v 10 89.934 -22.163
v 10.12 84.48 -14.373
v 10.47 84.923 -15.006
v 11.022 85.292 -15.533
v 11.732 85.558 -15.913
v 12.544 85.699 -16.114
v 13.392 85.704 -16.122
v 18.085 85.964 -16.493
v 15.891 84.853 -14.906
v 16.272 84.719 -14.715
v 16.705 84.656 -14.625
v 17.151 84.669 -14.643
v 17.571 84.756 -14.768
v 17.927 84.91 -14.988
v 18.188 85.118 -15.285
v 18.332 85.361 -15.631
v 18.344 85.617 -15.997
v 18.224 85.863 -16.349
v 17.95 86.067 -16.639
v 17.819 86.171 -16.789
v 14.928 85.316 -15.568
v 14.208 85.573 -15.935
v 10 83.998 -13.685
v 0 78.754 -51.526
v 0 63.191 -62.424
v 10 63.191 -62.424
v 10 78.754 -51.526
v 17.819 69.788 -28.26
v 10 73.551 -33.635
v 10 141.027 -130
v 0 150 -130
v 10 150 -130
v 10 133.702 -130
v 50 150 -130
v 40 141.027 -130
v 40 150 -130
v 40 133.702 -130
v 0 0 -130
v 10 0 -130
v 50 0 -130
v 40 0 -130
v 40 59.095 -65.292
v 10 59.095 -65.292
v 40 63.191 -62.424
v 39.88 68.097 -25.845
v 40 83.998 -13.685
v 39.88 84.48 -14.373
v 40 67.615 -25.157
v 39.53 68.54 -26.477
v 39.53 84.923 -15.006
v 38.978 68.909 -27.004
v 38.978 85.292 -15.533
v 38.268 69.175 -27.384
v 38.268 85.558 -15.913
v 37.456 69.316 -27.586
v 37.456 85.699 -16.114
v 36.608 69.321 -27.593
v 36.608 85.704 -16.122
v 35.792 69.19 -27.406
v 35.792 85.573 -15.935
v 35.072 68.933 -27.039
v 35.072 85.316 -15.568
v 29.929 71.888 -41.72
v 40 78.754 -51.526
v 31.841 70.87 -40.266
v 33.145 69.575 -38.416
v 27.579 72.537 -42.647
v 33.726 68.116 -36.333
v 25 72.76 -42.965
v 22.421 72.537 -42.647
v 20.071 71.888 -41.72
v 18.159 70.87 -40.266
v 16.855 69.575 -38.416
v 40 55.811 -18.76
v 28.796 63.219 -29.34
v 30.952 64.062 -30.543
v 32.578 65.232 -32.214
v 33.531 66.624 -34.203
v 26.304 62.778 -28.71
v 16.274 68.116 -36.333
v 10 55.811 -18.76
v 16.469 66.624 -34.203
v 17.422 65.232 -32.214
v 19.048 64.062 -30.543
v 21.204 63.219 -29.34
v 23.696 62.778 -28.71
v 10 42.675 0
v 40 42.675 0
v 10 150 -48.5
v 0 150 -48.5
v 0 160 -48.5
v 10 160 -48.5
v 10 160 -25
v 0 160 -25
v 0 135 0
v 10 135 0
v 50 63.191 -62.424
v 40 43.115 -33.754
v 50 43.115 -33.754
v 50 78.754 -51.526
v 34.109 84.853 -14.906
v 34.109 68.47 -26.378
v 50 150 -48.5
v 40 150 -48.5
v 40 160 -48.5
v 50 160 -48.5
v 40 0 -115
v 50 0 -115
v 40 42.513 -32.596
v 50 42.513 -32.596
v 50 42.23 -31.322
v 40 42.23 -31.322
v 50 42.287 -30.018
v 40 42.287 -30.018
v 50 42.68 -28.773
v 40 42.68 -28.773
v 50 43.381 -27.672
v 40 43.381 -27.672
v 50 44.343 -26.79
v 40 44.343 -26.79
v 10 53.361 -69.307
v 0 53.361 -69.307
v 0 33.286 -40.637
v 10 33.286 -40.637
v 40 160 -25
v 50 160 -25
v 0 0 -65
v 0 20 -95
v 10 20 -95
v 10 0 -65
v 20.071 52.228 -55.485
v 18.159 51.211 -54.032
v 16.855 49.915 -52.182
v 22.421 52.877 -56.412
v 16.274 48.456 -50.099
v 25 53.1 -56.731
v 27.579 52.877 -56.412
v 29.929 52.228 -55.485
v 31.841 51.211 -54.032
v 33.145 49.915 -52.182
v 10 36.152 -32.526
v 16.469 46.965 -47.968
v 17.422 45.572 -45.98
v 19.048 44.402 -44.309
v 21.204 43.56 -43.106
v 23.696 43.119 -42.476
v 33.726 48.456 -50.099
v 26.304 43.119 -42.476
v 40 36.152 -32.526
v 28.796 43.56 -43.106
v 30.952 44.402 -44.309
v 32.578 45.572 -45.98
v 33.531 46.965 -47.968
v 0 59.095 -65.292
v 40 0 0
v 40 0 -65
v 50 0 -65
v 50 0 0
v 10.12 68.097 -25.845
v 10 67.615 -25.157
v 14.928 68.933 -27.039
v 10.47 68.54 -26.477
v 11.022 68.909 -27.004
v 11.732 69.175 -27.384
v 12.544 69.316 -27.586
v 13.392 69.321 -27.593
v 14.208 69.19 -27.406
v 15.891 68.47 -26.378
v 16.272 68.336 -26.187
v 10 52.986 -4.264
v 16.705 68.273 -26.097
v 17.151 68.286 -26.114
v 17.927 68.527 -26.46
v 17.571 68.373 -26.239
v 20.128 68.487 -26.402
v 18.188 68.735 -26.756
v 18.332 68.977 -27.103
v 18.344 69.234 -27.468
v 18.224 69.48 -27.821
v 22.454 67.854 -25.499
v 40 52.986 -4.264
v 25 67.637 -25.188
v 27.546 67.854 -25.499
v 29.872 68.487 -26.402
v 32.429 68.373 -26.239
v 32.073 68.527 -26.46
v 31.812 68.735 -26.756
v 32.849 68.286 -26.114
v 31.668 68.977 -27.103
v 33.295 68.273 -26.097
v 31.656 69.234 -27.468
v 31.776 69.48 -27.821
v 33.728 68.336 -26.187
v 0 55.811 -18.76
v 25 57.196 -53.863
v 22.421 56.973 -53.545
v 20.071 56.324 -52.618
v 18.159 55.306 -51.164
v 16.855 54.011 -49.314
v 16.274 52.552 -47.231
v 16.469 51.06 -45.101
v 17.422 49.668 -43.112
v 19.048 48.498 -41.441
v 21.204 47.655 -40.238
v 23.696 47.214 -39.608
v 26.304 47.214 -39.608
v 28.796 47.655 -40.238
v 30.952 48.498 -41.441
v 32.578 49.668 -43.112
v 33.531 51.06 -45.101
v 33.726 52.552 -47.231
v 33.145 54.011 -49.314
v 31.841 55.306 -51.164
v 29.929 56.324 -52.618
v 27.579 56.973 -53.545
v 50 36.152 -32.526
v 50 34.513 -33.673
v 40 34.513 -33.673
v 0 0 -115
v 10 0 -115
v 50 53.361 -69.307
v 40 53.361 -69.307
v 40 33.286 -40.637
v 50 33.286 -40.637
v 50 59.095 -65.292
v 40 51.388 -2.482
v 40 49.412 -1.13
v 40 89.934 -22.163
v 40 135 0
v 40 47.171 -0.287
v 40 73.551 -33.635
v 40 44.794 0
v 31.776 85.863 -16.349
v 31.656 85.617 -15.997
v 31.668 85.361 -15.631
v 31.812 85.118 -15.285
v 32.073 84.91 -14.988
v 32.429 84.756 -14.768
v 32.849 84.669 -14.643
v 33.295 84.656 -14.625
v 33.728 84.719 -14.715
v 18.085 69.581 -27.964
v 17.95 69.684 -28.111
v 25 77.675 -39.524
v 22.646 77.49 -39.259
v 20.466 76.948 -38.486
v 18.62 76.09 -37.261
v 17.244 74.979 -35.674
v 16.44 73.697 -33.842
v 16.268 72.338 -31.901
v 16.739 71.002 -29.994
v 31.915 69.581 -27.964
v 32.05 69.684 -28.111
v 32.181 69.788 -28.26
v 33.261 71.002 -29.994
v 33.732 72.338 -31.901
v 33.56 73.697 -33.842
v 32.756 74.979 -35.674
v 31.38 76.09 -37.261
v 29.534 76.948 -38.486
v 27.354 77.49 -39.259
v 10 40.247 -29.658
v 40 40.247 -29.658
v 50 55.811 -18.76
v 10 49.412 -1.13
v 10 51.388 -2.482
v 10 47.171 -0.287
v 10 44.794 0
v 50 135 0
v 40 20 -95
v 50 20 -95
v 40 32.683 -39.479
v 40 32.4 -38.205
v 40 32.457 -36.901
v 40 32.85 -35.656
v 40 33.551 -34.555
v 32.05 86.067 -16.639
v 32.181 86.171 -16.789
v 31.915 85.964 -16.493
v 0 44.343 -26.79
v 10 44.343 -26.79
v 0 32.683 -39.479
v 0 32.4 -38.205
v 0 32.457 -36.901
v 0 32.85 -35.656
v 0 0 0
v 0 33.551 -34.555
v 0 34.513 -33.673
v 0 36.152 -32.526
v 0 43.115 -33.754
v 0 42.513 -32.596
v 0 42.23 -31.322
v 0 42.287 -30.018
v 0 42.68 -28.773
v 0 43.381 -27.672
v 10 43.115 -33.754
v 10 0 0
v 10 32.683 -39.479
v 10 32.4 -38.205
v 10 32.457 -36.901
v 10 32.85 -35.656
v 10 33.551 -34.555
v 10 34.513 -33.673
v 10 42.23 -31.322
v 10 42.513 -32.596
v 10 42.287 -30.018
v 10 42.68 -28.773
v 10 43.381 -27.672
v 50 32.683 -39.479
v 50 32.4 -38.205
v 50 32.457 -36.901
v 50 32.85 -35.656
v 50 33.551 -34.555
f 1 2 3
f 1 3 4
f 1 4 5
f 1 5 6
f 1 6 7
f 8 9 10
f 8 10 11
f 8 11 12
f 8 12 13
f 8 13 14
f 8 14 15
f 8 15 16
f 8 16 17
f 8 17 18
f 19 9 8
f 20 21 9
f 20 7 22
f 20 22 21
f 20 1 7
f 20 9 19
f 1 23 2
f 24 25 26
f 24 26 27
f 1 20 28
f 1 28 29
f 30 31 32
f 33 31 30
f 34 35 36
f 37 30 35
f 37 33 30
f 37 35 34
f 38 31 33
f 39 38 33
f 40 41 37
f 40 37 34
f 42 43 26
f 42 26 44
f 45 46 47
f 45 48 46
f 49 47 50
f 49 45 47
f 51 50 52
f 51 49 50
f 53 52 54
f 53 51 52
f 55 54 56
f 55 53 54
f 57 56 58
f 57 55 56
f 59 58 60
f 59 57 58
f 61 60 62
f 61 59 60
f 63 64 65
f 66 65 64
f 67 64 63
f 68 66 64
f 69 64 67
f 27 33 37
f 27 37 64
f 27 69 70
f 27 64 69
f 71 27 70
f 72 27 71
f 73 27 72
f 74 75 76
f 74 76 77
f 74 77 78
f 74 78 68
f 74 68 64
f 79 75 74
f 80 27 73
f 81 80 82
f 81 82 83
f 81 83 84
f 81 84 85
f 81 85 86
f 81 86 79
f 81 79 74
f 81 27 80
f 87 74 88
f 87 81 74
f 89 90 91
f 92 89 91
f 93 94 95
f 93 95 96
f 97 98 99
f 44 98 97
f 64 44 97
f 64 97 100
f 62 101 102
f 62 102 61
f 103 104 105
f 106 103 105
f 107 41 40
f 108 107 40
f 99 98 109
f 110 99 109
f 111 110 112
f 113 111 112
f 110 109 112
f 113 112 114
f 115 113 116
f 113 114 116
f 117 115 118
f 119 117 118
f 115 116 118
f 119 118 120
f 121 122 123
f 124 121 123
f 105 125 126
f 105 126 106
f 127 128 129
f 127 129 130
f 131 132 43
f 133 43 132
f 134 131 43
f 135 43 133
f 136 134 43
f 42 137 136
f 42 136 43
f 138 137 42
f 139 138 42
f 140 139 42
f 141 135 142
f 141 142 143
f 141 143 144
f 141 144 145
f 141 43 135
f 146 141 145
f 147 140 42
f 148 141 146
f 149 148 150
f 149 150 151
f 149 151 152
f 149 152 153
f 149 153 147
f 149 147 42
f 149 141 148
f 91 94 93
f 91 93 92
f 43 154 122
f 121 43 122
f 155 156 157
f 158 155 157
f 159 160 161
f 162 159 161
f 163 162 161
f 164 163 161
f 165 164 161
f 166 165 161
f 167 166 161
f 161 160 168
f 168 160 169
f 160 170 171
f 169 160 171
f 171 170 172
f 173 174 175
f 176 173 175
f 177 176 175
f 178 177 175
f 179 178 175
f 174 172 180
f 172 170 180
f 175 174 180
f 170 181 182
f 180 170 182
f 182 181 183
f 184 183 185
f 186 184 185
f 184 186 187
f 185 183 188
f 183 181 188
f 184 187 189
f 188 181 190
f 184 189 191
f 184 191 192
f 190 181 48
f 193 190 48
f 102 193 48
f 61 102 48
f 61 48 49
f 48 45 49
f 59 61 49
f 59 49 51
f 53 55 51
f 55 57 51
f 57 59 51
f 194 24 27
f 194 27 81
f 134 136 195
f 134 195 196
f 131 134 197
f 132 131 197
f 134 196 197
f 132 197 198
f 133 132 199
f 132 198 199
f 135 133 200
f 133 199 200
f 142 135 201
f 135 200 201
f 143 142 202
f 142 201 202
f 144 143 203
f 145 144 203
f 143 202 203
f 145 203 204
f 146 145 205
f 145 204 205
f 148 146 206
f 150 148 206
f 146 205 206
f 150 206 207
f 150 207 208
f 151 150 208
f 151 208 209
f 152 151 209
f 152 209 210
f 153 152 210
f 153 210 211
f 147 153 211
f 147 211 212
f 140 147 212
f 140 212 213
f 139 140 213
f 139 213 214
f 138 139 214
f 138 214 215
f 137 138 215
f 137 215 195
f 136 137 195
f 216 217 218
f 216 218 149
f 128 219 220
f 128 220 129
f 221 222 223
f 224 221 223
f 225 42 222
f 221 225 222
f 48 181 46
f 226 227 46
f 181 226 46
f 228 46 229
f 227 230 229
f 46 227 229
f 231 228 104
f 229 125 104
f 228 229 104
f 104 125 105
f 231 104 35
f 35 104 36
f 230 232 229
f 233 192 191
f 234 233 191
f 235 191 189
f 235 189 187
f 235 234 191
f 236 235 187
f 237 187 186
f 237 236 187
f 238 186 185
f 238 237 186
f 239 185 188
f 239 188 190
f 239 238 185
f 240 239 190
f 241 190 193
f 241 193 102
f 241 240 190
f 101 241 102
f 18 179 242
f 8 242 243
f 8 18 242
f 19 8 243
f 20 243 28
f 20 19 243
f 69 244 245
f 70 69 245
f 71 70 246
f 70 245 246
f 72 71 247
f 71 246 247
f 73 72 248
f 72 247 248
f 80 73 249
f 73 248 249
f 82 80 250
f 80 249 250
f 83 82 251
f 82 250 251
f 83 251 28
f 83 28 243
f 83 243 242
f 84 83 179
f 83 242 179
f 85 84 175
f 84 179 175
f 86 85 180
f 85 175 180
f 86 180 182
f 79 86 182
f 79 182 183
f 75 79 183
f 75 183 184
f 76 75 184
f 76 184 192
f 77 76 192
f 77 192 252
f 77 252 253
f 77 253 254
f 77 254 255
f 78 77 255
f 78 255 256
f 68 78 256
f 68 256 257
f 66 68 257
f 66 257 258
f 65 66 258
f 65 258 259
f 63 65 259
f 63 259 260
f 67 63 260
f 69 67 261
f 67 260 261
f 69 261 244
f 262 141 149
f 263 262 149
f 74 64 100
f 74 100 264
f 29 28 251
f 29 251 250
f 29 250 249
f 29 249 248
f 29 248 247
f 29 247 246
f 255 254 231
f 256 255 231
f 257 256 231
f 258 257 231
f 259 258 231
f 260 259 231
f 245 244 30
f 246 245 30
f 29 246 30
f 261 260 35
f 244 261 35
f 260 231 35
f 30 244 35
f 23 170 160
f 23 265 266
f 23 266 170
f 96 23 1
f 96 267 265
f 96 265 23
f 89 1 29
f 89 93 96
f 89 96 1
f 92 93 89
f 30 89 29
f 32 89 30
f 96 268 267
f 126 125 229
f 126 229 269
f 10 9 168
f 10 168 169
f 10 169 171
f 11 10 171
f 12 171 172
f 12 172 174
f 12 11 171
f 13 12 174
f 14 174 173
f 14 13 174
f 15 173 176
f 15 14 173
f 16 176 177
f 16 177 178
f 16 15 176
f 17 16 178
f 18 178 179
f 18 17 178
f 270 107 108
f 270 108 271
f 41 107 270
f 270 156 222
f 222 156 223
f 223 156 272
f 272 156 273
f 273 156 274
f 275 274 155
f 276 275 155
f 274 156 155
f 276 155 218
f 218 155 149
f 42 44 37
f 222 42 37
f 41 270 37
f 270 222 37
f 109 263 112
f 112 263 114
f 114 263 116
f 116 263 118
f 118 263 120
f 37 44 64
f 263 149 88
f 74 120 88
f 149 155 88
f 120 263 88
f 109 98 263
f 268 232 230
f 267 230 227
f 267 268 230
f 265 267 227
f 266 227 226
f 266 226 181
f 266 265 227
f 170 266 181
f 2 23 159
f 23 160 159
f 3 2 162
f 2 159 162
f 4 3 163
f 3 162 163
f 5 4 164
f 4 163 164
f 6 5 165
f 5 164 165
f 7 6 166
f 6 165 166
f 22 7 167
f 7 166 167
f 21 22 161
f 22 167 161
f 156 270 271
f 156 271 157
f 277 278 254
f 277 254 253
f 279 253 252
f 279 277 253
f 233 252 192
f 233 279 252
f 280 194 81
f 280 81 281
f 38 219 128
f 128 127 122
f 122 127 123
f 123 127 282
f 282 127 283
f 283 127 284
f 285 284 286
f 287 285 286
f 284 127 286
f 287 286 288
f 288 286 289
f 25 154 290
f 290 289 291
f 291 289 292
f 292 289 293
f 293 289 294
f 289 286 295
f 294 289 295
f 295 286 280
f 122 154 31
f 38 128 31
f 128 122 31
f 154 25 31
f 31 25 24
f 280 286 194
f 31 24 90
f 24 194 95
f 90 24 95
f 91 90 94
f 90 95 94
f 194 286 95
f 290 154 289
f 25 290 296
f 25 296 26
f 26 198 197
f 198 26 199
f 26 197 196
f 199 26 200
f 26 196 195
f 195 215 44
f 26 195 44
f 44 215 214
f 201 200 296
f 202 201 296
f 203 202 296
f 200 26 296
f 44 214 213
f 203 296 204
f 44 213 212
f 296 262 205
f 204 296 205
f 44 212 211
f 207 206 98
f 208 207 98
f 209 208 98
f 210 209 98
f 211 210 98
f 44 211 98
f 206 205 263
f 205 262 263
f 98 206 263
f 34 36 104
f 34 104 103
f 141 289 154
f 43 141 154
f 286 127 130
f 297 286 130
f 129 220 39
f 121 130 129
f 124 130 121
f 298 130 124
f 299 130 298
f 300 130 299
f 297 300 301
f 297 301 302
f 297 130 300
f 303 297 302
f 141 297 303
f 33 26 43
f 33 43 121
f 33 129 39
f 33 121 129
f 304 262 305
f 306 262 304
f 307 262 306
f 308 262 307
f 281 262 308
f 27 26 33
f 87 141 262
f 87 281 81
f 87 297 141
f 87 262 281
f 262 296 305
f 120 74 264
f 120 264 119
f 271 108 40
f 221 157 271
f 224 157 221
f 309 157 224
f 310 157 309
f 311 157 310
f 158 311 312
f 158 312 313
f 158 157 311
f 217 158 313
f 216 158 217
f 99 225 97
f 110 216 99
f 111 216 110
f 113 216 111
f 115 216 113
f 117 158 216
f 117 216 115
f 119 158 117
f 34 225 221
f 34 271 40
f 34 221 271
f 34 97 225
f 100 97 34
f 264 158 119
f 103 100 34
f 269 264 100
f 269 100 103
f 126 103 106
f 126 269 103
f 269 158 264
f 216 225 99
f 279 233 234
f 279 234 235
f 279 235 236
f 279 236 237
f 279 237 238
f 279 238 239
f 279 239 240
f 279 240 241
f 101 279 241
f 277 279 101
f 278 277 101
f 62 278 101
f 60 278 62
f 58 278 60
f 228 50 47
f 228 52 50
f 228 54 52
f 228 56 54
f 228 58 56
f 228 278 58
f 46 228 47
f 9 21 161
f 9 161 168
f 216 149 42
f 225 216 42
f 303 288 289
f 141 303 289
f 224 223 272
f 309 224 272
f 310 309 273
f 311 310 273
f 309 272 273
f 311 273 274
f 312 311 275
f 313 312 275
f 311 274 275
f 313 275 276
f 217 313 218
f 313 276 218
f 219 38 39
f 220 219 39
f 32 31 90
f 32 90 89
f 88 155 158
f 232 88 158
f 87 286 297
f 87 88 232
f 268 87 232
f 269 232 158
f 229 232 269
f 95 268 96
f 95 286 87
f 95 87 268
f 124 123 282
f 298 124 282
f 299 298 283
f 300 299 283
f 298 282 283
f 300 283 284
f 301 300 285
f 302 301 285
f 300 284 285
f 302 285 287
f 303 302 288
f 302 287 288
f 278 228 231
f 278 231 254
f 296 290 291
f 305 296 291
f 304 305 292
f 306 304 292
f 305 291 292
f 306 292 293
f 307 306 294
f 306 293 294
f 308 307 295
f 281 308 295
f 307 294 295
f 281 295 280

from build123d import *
from build123d.topology import SkipClean

# Parameters (mm, degrees)
SKETCH5_W           = 50
SKETCH5_H           = 130
BOSS_EXTRUDE1_DEPTH = 150
CUT_EXTRUDE1_START  = -25
CUT_EXTRUDE1_DEPTH  = 15
BOSS_EXTRUDE3_START = 30
SKETCH17_W          = 30
SKETCH17_H          = 40
BOSS_EXTRUDE3_DEPTH = 5
SKETCH10_R          = 8.75
CUT_EXTRUDE3_DEPTH  = 100
SKETCH18_W          = 48.5
SKETCH18_H          = 10
BOSS_EXTRUDE4_DEPTH = 10
BOSS_EXTRUDE5_START = 40
SKETCH18_2_W        = 48.5
SKETCH18_2_H        = 10
BOSS_EXTRUDE5_DEPTH = 10
CHAMFER1_SIZE       = 25
CUT_EXTRUDE5_DEPTH  = 70
FILLET1_DEPTH       = 10
FILLET1_START       = 40
FILLET1_2_DEPTH     = 10
CUT_EXTRUDE6_DEPTH  = 70
FILLET2_R           = 10
BOSS_EXTRUDE6_START = 20
BOSS_EXTRUDE6_DEPTH = 20
FILLET4_R           = 3


with BuildPart() as part:
    # Sketch5 → Boss-Extrude1 (new body)
    with BuildSketch(Plane(origin=(0, 0, 0), x_dir=(1, 0, 0), z_dir=(0, 1, 0))):
        with Locations((25, 65)):
            Rectangle(SKETCH5_W, SKETCH5_H)
    extrude(amount=BOSS_EXTRUDE1_DEPTH)

    # Sketch7 → Cut-Extrude1 (cut, symmetric)
    with BuildSketch(Plane(origin=(50, 0, 0), x_dir=(0, 0, -1), z_dir=(1, 0, 0)).offset(CUT_EXTRUDE1_START)):
        Polygon((130, 0), (130, 133.702332435), (0, 42.675352467), (0, 0), align=None)
        Polygon((0, 50), (130, 141.026979967), (130, 150), (0, 150), align=None)
    extrude(amount=CUT_EXTRUDE1_DEPTH, both=True, mode=Mode.SUBTRACT)

    # Sketch17 → Boss-Extrude3 (add)
    with BuildSketch(Plane(origin=(0, 275.412054826, -321.921776796), x_dir=(1, 0, 0), z_dir=(0, -0.819152044288993, -0.5735764363510444)).offset(BOSS_EXTRUDE3_START)):
        with Locations((25, 354.293228142)):
            Rectangle(SKETCH17_W, SKETCH17_H)
    extrude(amount=-BOSS_EXTRUDE3_DEPTH)

    # Sketch10 → Cut-Extrude3 (cut)
    with BuildSketch(Plane(origin=(0, 33.550503583, 23.49231552), x_dir=(1, 0, 0), z_dir=(0, 0.819152044288993, 0.5735764363510444))):
        with Locations(Location((25, 68.178273127, 0), (0, 0, 90))):
            Circle(SKETCH10_R)
    extrude(amount=-CUT_EXTRUDE3_DEPTH, mode=Mode.SUBTRACT)

    # Sketch18 → Boss-Extrude4 (add)
    with BuildSketch(Plane(origin=(0, 0, 0), x_dir=(0, 0, -1), z_dir=(1, 0, 0))):
        with Locations((24.25, 155)):
            Rectangle(SKETCH18_W, SKETCH18_H)
    extrude(amount=BOSS_EXTRUDE4_DEPTH)

    # Sketch18<2> → Boss-Extrude5 (add)
    with BuildSketch(Plane(origin=(0, 0, 0), x_dir=(0, 0, -1), z_dir=(1, 0, 0)).offset(BOSS_EXTRUDE5_START)):
        with Locations((24.25, 155)):
            Rectangle(SKETCH18_2_W, SKETCH18_2_H)
    extrude(amount=BOSS_EXTRUDE5_DEPTH)

    # Chamfer1
    chamfer1_edges = [part.edges().sort_by_distance(p)[0] for p in [
        (5, 160, 0),
        (45, 160, 0),
    ]]
    chamfer(chamfer1_edges, length=CHAMFER1_SIZE)

    # Sketch21 → Cut-Extrude5 (cut)
    with BuildSketch(Plane(origin=(0, 0, 0), x_dir=(0, 0, -1), z_dir=(1, 0, 0))):
        Polygon((62.42420648, 63.190535225), (51.526254189, 78.754424066), (18.760172418, 55.811366612), (29.658124708, 40.247477771), align=None)
        Polygon((69.307123716, 53.360710693), (36.541041945, 30.417653239), (32.52600689, 36.151717549), (65.292088662, 59.094775003), align=None)
    extrude(amount=CUT_EXTRUDE5_DEPTH, mode=Mode.SUBTRACT)

    # Fillet1: read off the stored shape, not the designer's step
    # Fillet1 outline → Fillet1 (add)
    with BuildSketch(Plane.YZ):
        with BuildLine():
            Line((30.417653239, -36.541041945), (33.285535421, -40.636802166))
            ThreePointArc((33.285535421, -40.636802166), (32.457256878, -36.900679096), (34.513413461, -33.673159763))
            Line((34.513413461, -33.673159763), (30.417653239, -36.541041945))
        make_face()
        with BuildLine():
            ThreePointArc((43.115359953, -33.75388493), (42.287081409, -30.01776186), (44.343237992, -26.790242527))
            Line((44.343237992, -26.790242527), (40.247477771, -29.658124708))
            Line((40.247477771, -29.658124708), (43.115359953, -33.75388493))
        make_face()
    extrude(amount=FILLET1_DEPTH)

    # Fillet1 2 outline → Fillet1 2 (add)
    with BuildSketch(Plane.YZ.offset(FILLET1_START)):
        with BuildLine():
            Line((30.417653239, -36.541041945), (33.285535421, -40.636802166))
            ThreePointArc((33.285535421, -40.636802166), (32.457256878, -36.900679096), (34.513413461, -33.673159763))
            Line((34.513413461, -33.673159763), (30.417653239, -36.541041945))
        make_face()
        with BuildLine():
            ThreePointArc((43.115359953, -33.75388493), (42.287081409, -30.01776186), (44.343237992, -26.790242527))
            Line((44.343237992, -26.790242527), (40.247477771, -29.658124708))
            Line((40.247477771, -29.658124708), (43.115359953, -33.75388493))
        make_face()
    extrude(amount=FILLET1_2_DEPTH)

    # Sketch22 → Cut-Extrude6 (cut)
    with BuildSketch(Plane.ZY):
        Polygon((-115, 0), (-95, 20), (-65, 0), align=None)
    extrude(amount=-CUT_EXTRUDE6_DEPTH, mode=Mode.SUBTRACT)

    # Fillet2
    fillet2_edges = [part.edges().sort_by_distance(p)[0] for p in [
        (25, 50, 0),
    ]]
    fillet(fillet2_edges, radius=FILLET2_R)

    # Sketch23 → Boss-Extrude6 (add)
    with SkipClean():  # the faces are left unmerged after this step: merging them gives an invalid solid
        with BuildSketch(Plane(origin=(0, 33.550503583, 23.49231552), x_dir=(1, 0, 0), z_dir=(0, 0.819152044288993, 0.5735764363510445)).offset(BOSS_EXTRUDE6_START)):
            with BuildLine():
                Line((40, 69.739442097), (32.180703308, 63.178273127))
                ThreePointArc((32.180703308, 63.178273127), (31.983337112, 62.906129088), (31.77566264, 62.64176739))
                ThreePointArc((31.77566264, 62.64176739), (32.241088602, 60.832062958), (34.109066137, 60.880139798))
                Line((34.109066137, 60.880139798), (40, 65.823220229))
                Line((40, 65.823220229), (40, 69.739442097))
            make_face()
            with BuildLine():
                ThreePointArc((18.22433736, 62.64176739), (18.016662888, 62.906129088), (17.819296692, 63.178273127))
                Line((17.819296692, 63.178273127), (10, 69.739442097))
                Line((10, 69.739442097), (10, 65.823220229))
                Line((10, 65.823220229), (15.890933863, 60.880139798))
                ThreePointArc((15.890933863, 60.880139798), (17.758911398, 60.832062958), (18.22433736, 62.64176739))
            make_face()
        extrude(amount=-BOSS_EXTRUDE6_DEPTH)

    # Fillet4
    fillet4_edges = [part.edges().sort_by_distance(p)[0] for p in [
        (40, 79.496672114, -24.691145529),
        (10, 79.496672114, -24.691145529),
    ]]
    fillet(fillet4_edges, radius=FILLET4_R)


solid = part.part
